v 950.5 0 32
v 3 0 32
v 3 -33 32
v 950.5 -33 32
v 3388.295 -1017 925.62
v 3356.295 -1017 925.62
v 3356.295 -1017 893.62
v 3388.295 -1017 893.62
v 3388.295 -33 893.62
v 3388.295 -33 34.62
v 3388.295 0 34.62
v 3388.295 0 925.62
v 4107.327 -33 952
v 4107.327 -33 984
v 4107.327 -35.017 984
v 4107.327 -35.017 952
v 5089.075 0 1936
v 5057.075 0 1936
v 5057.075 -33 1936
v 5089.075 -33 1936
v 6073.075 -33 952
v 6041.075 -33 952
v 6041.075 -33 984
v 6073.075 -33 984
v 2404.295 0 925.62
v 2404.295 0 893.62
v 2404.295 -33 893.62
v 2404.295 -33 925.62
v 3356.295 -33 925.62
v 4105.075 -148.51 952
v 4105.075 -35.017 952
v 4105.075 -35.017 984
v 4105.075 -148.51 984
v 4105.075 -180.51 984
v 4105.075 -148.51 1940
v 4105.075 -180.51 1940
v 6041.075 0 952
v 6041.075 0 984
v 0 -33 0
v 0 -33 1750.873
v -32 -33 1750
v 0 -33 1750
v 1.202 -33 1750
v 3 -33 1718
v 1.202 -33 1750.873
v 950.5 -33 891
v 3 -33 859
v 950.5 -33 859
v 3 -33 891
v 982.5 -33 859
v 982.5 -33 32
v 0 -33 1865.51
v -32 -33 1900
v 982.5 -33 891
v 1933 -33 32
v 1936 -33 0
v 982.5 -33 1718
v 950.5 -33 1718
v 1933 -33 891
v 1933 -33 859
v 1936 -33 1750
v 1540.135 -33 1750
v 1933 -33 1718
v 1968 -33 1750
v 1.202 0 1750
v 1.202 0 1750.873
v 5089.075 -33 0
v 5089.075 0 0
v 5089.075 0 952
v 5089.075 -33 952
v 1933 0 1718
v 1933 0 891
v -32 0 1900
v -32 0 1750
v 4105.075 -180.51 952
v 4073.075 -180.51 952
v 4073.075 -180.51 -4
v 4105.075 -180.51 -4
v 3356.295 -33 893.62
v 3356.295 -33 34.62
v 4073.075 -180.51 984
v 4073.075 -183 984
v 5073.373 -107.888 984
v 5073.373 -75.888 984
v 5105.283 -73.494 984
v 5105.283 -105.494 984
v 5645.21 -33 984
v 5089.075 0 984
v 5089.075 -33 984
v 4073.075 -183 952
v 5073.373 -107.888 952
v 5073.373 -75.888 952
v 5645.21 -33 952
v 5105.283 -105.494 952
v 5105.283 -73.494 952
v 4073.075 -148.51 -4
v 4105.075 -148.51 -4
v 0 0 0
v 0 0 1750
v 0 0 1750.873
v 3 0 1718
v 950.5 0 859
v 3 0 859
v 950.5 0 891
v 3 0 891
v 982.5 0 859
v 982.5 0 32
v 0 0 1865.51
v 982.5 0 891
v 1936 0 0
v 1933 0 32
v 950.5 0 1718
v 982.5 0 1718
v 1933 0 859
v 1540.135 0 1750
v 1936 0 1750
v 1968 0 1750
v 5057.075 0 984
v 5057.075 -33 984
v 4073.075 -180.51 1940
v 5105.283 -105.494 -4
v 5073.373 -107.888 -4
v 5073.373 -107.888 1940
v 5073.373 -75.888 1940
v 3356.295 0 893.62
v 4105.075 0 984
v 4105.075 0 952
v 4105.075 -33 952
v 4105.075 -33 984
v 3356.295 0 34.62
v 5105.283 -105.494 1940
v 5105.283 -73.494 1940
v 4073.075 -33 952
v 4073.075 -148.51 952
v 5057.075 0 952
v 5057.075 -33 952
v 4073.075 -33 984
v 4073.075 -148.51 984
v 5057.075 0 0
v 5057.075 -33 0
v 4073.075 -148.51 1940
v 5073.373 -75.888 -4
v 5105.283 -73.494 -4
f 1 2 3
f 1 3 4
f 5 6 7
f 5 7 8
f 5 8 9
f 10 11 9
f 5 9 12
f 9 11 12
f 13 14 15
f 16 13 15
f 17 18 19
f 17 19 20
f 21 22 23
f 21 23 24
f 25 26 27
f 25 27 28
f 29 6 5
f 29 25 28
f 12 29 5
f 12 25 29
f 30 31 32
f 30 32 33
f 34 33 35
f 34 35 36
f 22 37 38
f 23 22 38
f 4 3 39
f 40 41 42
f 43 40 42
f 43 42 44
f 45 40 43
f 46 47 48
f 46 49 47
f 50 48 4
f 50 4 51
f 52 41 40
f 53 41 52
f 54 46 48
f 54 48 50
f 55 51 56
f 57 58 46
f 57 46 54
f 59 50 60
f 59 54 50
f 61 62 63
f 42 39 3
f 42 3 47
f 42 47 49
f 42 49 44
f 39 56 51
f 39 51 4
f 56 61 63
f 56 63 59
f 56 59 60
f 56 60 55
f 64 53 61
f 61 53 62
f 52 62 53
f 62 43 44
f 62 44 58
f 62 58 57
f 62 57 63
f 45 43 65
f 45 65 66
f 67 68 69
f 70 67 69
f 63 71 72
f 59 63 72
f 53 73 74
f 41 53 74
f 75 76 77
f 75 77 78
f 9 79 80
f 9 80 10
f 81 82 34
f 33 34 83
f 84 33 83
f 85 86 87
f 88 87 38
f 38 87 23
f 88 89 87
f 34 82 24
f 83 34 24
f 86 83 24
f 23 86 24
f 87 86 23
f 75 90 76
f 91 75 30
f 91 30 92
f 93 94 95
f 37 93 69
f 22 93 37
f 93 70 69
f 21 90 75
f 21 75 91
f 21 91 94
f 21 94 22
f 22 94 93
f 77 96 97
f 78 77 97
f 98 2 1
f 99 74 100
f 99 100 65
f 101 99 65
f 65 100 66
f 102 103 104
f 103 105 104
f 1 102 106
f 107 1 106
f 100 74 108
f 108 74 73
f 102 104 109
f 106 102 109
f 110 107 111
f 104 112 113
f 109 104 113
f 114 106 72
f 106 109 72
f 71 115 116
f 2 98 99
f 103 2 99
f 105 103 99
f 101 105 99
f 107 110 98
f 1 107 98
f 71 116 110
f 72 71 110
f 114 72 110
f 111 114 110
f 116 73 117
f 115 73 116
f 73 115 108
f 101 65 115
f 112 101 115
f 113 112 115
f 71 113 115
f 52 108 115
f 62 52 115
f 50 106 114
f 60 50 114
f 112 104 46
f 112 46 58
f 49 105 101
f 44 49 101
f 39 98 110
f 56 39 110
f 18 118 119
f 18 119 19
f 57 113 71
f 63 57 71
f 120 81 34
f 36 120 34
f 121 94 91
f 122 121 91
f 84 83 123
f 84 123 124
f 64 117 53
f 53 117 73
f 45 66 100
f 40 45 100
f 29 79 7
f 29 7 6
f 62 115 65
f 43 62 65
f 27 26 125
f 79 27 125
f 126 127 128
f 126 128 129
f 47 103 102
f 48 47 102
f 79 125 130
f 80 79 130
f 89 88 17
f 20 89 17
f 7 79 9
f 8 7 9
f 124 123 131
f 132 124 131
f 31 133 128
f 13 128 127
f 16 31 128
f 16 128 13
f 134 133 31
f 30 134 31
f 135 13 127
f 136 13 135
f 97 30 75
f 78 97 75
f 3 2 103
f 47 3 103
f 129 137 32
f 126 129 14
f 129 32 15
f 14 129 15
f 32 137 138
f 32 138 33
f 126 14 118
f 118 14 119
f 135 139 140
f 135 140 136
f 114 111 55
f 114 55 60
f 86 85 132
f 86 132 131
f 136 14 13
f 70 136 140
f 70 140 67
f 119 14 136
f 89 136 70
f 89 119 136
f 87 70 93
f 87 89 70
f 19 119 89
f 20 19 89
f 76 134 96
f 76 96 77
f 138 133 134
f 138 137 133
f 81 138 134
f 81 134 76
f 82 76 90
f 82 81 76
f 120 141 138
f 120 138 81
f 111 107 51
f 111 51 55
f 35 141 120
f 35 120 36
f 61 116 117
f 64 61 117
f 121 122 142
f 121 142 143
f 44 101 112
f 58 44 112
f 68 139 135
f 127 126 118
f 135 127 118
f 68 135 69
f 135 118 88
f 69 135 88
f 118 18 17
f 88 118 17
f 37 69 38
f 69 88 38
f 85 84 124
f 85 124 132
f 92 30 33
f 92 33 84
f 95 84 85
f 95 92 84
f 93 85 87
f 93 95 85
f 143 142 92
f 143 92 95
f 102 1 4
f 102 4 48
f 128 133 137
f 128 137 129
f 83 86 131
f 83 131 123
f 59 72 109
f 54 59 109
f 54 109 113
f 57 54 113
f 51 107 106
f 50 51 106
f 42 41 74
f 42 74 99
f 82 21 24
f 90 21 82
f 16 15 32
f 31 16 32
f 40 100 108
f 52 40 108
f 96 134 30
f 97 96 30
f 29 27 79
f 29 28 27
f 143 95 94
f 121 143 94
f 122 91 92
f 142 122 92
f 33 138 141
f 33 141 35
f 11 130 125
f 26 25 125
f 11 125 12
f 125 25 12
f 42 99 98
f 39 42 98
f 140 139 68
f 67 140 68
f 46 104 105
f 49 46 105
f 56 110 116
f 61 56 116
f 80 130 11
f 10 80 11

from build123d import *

# Parameters (mm, degrees)
F0_W     = 952
F0_H     = 32
F1_DEPTH = 33
F0_W_2   = 32
F0_H_2   = 952
F0_W_3   = 947.5
F0_H_3   = 827
F0_W_4   = 950.5
F2_W     = 32
F2_H     = 32
F3_DEPTH = 984
F5_DEPTH = 32
F6_W     = 32
F6_H     = 32
F7_DEPTH = 956
F8_DEPTH = 988


# Not quite as in the source:
# - a feature names something its author has since deleted; it is built from what else it names


with BuildPart() as f1:
    # F0 (on Front) → F1 (new body)
    with BuildSketch(Plane.XZ):
        Polygon((3356.2954444885, 34.6195969582), (3388.2954444885, 34.6195969582), (3388.2954444885, 925.6195969582), (3356.2954444885, 925.6195969582), (3356.2954444885, 893.6195969582), align=None)
        with Locations((2880.2954444885, 909.6195969582)):
            Rectangle(F0_W, F0_H)
    extrude(amount=F1_DEPTH)

    # F2 (on face) → F3 (join)
    with BuildSketch(Plane.XZ.offset(33)):
        with Locations((3372.2954444885, 909.6195969582)):
            Rectangle(F2_W, F2_H)
    extrude(amount=F3_DEPTH)


with BuildPart() as f1b:
    # F0 (on Front) → F1, piece 2 (new body)
    with BuildSketch(Plane.XZ):
        with Locations((5073.074546814, 1460)):
            Rectangle(F0_W_2, F0_H_2)
        with Locations((5073.074546814, 476)):
            Rectangle(F0_W_2, F0_H_2)
        with Locations((4581.074546814, 968)):
            Rectangle(F0_W, F0_H)
        with Locations((5565.074546814, 968)):
            Rectangle(F0_W, F0_H)
        with Locations((5073.074546814, 968)):
            Rectangle(F0_W_2, F0_H)
    extrude(amount=F1_DEPTH)

    # F4 (on face) → F5 (join)
    with BuildSketch(Plane(origin=(0, 0, 952), x_dir=(1, 0, 0), z_dir=(0, 0, -1))):
        Polygon((4073.074546814, 33), (4105.074546814, 33), (4107.3265075684, 33), (4107.3265075684, 35.0165888667), (4105.074546814, 35.0165888667), (4105.074546814, 148.5101262078), (5645.2095629178, 33), (6041.074546814, 33), (6073.074546814, 33), (4073.074546814, 183), align=None)
    extrude(amount=-F5_DEPTH)

    # F6 (on face) → F7 (join)
    with BuildSketch(Plane(origin=(0, 0, 952), x_dir=(1, 0, 0), z_dir=(0, 0, -1))):
        with Locations((4089.074546814, 164.5101262078)):
            Rectangle(F6_W, F6_H)
        Polygon((5073.3726069148, 107.8877717002), (5073.3726069148, 75.8877717002), (5105.2829848312, 73.4944933565), (5105.2829848312, 105.4944933565), align=None)
    extrude(amount=F7_DEPTH)

    # F6 (on face) → F8 (join)
    with BuildSketch(Plane(origin=(0, 0, 952), x_dir=(1, 0, 0), z_dir=(0, 0, -1))):
        with Locations((4089.074546814, 164.5101262078)):
            Rectangle(F6_W, F6_H)
        Polygon((5073.3726069148, 107.8877717002), (5073.3726069148, 75.8877717002), (5105.2829848312, 73.4944933565), (5105.2829848312, 105.4944933565), align=None)
    extrude(amount=-F8_DEPTH)


with BuildPart() as f1c:
    # F0 (on Front) → F1, piece 3 (new body)
    with BuildSketch(Plane.XZ):
        Polygon((0, 1750), (0, 0), (1933, 0), (1936, 0), (1936, 1750), (1968, 1750), (-32, 1900), (-32, 1750), align=None)
        with Locations((476.75, 445.5)):
            Rectangle(F0_W_3, F0_H_3, mode=Mode.SUBTRACT)
        with Locations((1457.75, 445.5)):
            Rectangle(F0_W_4, F0_H_3, mode=Mode.SUBTRACT)
        Polygon((982.5, 891), (982.5, 859), (950.5, 859), (950.5, 891), (3, 891), (3, 1718), (950.5, 1718), (982.5, 1718), (1933, 1718), (1933, 891), align=None, mode=Mode.SUBTRACT)
        Polygon((1540.1350161039, 1750), (1.2016075198, 1750), (1.2016075198, 1750.8734464645), (0, 1750.8734464645), (0, 1865.5101262078), align=None, mode=Mode.SUBTRACT)
        with Locations((966.5, 875)):
            Rectangle(F0_W_2, F0_H)
        with Locations((966.5, 1304.5)):
            Rectangle(F0_W_2, F0_H_3)
    extrude(amount=F1_DEPTH)


solid = Compound([f1.part, f1b.part, f1c.part])
